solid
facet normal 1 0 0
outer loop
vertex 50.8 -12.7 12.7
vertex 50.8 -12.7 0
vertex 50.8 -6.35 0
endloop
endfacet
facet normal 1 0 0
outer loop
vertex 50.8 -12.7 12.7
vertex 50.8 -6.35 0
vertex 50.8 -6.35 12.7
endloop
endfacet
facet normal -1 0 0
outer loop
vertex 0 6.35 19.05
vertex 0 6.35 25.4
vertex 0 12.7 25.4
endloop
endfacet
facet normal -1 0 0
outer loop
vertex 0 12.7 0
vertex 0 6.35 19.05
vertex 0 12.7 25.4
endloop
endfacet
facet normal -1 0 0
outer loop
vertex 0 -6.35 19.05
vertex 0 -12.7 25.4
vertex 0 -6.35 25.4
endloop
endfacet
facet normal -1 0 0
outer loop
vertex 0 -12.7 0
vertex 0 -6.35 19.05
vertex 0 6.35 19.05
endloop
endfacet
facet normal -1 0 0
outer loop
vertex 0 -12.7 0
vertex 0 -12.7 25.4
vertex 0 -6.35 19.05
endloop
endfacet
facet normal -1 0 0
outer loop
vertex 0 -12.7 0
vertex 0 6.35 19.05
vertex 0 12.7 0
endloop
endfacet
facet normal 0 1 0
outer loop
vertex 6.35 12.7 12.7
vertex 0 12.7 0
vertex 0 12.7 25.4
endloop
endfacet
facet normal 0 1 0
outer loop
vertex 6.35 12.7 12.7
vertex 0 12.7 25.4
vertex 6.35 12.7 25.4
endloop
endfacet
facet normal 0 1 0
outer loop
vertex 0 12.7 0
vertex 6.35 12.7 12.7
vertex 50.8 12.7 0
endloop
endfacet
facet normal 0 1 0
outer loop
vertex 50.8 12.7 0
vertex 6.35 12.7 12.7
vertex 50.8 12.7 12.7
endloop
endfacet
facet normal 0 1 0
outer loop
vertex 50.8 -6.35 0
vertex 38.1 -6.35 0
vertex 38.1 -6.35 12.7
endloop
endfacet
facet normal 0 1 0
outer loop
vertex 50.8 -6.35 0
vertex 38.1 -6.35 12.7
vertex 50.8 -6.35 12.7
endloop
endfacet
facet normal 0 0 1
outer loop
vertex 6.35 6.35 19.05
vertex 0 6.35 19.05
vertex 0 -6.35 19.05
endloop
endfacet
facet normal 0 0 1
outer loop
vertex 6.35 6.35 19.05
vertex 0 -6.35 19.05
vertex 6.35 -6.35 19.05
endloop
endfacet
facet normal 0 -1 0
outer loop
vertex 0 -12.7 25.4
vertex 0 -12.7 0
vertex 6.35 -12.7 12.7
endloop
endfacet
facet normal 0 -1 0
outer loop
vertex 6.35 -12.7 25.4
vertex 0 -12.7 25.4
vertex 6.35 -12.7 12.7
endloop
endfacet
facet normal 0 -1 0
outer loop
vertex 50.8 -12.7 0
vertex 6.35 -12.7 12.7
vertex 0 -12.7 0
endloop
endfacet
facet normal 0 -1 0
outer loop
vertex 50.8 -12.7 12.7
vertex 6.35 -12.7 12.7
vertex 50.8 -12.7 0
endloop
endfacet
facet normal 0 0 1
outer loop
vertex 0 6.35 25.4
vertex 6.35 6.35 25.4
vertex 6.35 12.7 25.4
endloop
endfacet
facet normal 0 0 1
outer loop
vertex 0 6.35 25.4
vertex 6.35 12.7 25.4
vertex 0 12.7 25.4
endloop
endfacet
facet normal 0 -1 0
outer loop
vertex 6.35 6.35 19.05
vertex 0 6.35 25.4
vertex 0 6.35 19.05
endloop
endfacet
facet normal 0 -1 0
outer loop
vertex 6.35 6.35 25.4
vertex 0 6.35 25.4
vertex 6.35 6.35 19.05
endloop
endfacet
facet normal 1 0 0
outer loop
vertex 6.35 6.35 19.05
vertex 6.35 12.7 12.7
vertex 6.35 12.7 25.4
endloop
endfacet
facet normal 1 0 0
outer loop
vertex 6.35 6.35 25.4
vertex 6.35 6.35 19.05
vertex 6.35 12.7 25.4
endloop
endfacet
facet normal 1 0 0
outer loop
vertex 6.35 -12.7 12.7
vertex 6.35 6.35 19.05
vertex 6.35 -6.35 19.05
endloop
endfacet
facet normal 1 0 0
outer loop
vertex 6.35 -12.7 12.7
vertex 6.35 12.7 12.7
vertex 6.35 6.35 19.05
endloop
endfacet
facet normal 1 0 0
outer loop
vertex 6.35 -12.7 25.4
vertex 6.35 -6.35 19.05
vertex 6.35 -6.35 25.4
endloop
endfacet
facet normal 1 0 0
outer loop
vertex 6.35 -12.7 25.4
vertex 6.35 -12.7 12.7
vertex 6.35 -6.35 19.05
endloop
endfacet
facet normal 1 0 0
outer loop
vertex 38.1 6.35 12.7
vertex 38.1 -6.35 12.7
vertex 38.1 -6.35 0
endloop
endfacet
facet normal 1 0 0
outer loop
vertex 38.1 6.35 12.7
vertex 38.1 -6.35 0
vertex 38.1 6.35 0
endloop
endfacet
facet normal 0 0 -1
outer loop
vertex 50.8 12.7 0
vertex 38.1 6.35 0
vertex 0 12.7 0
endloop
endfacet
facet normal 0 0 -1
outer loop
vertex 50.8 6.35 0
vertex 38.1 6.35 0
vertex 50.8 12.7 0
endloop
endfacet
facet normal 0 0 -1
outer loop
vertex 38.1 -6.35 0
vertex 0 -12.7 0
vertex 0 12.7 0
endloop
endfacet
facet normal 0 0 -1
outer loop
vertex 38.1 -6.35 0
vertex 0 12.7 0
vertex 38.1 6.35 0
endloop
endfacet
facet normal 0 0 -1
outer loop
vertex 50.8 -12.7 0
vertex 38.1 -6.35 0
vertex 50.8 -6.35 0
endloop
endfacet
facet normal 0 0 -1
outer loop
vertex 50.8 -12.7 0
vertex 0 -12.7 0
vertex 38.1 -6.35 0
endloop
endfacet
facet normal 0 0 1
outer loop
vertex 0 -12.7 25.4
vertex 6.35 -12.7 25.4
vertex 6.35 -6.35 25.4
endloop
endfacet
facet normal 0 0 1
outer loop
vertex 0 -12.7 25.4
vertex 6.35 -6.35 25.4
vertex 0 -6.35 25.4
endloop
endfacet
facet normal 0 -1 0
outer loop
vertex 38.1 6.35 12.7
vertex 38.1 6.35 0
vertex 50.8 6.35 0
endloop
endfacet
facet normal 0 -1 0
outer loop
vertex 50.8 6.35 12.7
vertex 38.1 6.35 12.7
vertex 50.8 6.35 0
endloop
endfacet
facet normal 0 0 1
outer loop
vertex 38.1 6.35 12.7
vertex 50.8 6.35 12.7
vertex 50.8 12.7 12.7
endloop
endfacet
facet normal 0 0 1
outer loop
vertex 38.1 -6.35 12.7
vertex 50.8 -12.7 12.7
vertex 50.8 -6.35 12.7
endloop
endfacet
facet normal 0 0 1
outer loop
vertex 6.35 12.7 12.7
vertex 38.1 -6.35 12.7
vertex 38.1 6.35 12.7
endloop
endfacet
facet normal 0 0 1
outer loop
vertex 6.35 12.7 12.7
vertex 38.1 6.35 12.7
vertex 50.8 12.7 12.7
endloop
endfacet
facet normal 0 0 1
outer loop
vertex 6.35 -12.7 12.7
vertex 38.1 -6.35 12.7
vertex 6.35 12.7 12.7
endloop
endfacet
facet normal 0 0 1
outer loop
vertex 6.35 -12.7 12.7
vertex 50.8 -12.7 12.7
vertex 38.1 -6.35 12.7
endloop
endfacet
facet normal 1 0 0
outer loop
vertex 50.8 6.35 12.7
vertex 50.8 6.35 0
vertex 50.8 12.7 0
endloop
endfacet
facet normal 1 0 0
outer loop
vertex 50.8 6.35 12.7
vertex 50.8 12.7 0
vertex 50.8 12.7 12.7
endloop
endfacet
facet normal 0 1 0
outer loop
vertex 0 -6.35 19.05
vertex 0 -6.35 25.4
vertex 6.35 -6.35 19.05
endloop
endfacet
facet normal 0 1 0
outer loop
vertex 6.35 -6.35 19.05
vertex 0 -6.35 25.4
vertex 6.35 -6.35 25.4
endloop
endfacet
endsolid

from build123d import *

# Parameters (mm, degrees)
F1_DEPTH = 12.7
F2_W     = 6.35
F2_H     = 12.7
F3_DEPTH = 6.35
F4_W     = 12.7
F4_H     = 12.7
F5_DEPTH = 12.701


with BuildPart() as f1:
    # F0 (on Front) → F1 (new body, symmetric)
    with BuildSketch(Plane.XZ):
        Polygon((0, 25.4), (0, 0), (50.8, 0), (50.8, 12.7), (6.35, 12.7), (6.35, 25.4), align=None)
    extrude(amount=F1_DEPTH, both=True)

    # F2 (on face) → F3 (cut)
    with BuildSketch(Plane.XY.offset(25.4)):
        with Locations((3.175, 0)):
            Rectangle(F2_W, F2_H)
    extrude(amount=-F3_DEPTH, mode=Mode.SUBTRACT)

    # F4 (on face) → F5 (cut, through all)
    with BuildSketch(Plane.XY.offset(12.7)):
        with Locations((44.45, 0)):
            Rectangle(F4_W, F4_H)
    extrude(amount=-F5_DEPTH, mode=Mode.SUBTRACT)


solid = f1.part
